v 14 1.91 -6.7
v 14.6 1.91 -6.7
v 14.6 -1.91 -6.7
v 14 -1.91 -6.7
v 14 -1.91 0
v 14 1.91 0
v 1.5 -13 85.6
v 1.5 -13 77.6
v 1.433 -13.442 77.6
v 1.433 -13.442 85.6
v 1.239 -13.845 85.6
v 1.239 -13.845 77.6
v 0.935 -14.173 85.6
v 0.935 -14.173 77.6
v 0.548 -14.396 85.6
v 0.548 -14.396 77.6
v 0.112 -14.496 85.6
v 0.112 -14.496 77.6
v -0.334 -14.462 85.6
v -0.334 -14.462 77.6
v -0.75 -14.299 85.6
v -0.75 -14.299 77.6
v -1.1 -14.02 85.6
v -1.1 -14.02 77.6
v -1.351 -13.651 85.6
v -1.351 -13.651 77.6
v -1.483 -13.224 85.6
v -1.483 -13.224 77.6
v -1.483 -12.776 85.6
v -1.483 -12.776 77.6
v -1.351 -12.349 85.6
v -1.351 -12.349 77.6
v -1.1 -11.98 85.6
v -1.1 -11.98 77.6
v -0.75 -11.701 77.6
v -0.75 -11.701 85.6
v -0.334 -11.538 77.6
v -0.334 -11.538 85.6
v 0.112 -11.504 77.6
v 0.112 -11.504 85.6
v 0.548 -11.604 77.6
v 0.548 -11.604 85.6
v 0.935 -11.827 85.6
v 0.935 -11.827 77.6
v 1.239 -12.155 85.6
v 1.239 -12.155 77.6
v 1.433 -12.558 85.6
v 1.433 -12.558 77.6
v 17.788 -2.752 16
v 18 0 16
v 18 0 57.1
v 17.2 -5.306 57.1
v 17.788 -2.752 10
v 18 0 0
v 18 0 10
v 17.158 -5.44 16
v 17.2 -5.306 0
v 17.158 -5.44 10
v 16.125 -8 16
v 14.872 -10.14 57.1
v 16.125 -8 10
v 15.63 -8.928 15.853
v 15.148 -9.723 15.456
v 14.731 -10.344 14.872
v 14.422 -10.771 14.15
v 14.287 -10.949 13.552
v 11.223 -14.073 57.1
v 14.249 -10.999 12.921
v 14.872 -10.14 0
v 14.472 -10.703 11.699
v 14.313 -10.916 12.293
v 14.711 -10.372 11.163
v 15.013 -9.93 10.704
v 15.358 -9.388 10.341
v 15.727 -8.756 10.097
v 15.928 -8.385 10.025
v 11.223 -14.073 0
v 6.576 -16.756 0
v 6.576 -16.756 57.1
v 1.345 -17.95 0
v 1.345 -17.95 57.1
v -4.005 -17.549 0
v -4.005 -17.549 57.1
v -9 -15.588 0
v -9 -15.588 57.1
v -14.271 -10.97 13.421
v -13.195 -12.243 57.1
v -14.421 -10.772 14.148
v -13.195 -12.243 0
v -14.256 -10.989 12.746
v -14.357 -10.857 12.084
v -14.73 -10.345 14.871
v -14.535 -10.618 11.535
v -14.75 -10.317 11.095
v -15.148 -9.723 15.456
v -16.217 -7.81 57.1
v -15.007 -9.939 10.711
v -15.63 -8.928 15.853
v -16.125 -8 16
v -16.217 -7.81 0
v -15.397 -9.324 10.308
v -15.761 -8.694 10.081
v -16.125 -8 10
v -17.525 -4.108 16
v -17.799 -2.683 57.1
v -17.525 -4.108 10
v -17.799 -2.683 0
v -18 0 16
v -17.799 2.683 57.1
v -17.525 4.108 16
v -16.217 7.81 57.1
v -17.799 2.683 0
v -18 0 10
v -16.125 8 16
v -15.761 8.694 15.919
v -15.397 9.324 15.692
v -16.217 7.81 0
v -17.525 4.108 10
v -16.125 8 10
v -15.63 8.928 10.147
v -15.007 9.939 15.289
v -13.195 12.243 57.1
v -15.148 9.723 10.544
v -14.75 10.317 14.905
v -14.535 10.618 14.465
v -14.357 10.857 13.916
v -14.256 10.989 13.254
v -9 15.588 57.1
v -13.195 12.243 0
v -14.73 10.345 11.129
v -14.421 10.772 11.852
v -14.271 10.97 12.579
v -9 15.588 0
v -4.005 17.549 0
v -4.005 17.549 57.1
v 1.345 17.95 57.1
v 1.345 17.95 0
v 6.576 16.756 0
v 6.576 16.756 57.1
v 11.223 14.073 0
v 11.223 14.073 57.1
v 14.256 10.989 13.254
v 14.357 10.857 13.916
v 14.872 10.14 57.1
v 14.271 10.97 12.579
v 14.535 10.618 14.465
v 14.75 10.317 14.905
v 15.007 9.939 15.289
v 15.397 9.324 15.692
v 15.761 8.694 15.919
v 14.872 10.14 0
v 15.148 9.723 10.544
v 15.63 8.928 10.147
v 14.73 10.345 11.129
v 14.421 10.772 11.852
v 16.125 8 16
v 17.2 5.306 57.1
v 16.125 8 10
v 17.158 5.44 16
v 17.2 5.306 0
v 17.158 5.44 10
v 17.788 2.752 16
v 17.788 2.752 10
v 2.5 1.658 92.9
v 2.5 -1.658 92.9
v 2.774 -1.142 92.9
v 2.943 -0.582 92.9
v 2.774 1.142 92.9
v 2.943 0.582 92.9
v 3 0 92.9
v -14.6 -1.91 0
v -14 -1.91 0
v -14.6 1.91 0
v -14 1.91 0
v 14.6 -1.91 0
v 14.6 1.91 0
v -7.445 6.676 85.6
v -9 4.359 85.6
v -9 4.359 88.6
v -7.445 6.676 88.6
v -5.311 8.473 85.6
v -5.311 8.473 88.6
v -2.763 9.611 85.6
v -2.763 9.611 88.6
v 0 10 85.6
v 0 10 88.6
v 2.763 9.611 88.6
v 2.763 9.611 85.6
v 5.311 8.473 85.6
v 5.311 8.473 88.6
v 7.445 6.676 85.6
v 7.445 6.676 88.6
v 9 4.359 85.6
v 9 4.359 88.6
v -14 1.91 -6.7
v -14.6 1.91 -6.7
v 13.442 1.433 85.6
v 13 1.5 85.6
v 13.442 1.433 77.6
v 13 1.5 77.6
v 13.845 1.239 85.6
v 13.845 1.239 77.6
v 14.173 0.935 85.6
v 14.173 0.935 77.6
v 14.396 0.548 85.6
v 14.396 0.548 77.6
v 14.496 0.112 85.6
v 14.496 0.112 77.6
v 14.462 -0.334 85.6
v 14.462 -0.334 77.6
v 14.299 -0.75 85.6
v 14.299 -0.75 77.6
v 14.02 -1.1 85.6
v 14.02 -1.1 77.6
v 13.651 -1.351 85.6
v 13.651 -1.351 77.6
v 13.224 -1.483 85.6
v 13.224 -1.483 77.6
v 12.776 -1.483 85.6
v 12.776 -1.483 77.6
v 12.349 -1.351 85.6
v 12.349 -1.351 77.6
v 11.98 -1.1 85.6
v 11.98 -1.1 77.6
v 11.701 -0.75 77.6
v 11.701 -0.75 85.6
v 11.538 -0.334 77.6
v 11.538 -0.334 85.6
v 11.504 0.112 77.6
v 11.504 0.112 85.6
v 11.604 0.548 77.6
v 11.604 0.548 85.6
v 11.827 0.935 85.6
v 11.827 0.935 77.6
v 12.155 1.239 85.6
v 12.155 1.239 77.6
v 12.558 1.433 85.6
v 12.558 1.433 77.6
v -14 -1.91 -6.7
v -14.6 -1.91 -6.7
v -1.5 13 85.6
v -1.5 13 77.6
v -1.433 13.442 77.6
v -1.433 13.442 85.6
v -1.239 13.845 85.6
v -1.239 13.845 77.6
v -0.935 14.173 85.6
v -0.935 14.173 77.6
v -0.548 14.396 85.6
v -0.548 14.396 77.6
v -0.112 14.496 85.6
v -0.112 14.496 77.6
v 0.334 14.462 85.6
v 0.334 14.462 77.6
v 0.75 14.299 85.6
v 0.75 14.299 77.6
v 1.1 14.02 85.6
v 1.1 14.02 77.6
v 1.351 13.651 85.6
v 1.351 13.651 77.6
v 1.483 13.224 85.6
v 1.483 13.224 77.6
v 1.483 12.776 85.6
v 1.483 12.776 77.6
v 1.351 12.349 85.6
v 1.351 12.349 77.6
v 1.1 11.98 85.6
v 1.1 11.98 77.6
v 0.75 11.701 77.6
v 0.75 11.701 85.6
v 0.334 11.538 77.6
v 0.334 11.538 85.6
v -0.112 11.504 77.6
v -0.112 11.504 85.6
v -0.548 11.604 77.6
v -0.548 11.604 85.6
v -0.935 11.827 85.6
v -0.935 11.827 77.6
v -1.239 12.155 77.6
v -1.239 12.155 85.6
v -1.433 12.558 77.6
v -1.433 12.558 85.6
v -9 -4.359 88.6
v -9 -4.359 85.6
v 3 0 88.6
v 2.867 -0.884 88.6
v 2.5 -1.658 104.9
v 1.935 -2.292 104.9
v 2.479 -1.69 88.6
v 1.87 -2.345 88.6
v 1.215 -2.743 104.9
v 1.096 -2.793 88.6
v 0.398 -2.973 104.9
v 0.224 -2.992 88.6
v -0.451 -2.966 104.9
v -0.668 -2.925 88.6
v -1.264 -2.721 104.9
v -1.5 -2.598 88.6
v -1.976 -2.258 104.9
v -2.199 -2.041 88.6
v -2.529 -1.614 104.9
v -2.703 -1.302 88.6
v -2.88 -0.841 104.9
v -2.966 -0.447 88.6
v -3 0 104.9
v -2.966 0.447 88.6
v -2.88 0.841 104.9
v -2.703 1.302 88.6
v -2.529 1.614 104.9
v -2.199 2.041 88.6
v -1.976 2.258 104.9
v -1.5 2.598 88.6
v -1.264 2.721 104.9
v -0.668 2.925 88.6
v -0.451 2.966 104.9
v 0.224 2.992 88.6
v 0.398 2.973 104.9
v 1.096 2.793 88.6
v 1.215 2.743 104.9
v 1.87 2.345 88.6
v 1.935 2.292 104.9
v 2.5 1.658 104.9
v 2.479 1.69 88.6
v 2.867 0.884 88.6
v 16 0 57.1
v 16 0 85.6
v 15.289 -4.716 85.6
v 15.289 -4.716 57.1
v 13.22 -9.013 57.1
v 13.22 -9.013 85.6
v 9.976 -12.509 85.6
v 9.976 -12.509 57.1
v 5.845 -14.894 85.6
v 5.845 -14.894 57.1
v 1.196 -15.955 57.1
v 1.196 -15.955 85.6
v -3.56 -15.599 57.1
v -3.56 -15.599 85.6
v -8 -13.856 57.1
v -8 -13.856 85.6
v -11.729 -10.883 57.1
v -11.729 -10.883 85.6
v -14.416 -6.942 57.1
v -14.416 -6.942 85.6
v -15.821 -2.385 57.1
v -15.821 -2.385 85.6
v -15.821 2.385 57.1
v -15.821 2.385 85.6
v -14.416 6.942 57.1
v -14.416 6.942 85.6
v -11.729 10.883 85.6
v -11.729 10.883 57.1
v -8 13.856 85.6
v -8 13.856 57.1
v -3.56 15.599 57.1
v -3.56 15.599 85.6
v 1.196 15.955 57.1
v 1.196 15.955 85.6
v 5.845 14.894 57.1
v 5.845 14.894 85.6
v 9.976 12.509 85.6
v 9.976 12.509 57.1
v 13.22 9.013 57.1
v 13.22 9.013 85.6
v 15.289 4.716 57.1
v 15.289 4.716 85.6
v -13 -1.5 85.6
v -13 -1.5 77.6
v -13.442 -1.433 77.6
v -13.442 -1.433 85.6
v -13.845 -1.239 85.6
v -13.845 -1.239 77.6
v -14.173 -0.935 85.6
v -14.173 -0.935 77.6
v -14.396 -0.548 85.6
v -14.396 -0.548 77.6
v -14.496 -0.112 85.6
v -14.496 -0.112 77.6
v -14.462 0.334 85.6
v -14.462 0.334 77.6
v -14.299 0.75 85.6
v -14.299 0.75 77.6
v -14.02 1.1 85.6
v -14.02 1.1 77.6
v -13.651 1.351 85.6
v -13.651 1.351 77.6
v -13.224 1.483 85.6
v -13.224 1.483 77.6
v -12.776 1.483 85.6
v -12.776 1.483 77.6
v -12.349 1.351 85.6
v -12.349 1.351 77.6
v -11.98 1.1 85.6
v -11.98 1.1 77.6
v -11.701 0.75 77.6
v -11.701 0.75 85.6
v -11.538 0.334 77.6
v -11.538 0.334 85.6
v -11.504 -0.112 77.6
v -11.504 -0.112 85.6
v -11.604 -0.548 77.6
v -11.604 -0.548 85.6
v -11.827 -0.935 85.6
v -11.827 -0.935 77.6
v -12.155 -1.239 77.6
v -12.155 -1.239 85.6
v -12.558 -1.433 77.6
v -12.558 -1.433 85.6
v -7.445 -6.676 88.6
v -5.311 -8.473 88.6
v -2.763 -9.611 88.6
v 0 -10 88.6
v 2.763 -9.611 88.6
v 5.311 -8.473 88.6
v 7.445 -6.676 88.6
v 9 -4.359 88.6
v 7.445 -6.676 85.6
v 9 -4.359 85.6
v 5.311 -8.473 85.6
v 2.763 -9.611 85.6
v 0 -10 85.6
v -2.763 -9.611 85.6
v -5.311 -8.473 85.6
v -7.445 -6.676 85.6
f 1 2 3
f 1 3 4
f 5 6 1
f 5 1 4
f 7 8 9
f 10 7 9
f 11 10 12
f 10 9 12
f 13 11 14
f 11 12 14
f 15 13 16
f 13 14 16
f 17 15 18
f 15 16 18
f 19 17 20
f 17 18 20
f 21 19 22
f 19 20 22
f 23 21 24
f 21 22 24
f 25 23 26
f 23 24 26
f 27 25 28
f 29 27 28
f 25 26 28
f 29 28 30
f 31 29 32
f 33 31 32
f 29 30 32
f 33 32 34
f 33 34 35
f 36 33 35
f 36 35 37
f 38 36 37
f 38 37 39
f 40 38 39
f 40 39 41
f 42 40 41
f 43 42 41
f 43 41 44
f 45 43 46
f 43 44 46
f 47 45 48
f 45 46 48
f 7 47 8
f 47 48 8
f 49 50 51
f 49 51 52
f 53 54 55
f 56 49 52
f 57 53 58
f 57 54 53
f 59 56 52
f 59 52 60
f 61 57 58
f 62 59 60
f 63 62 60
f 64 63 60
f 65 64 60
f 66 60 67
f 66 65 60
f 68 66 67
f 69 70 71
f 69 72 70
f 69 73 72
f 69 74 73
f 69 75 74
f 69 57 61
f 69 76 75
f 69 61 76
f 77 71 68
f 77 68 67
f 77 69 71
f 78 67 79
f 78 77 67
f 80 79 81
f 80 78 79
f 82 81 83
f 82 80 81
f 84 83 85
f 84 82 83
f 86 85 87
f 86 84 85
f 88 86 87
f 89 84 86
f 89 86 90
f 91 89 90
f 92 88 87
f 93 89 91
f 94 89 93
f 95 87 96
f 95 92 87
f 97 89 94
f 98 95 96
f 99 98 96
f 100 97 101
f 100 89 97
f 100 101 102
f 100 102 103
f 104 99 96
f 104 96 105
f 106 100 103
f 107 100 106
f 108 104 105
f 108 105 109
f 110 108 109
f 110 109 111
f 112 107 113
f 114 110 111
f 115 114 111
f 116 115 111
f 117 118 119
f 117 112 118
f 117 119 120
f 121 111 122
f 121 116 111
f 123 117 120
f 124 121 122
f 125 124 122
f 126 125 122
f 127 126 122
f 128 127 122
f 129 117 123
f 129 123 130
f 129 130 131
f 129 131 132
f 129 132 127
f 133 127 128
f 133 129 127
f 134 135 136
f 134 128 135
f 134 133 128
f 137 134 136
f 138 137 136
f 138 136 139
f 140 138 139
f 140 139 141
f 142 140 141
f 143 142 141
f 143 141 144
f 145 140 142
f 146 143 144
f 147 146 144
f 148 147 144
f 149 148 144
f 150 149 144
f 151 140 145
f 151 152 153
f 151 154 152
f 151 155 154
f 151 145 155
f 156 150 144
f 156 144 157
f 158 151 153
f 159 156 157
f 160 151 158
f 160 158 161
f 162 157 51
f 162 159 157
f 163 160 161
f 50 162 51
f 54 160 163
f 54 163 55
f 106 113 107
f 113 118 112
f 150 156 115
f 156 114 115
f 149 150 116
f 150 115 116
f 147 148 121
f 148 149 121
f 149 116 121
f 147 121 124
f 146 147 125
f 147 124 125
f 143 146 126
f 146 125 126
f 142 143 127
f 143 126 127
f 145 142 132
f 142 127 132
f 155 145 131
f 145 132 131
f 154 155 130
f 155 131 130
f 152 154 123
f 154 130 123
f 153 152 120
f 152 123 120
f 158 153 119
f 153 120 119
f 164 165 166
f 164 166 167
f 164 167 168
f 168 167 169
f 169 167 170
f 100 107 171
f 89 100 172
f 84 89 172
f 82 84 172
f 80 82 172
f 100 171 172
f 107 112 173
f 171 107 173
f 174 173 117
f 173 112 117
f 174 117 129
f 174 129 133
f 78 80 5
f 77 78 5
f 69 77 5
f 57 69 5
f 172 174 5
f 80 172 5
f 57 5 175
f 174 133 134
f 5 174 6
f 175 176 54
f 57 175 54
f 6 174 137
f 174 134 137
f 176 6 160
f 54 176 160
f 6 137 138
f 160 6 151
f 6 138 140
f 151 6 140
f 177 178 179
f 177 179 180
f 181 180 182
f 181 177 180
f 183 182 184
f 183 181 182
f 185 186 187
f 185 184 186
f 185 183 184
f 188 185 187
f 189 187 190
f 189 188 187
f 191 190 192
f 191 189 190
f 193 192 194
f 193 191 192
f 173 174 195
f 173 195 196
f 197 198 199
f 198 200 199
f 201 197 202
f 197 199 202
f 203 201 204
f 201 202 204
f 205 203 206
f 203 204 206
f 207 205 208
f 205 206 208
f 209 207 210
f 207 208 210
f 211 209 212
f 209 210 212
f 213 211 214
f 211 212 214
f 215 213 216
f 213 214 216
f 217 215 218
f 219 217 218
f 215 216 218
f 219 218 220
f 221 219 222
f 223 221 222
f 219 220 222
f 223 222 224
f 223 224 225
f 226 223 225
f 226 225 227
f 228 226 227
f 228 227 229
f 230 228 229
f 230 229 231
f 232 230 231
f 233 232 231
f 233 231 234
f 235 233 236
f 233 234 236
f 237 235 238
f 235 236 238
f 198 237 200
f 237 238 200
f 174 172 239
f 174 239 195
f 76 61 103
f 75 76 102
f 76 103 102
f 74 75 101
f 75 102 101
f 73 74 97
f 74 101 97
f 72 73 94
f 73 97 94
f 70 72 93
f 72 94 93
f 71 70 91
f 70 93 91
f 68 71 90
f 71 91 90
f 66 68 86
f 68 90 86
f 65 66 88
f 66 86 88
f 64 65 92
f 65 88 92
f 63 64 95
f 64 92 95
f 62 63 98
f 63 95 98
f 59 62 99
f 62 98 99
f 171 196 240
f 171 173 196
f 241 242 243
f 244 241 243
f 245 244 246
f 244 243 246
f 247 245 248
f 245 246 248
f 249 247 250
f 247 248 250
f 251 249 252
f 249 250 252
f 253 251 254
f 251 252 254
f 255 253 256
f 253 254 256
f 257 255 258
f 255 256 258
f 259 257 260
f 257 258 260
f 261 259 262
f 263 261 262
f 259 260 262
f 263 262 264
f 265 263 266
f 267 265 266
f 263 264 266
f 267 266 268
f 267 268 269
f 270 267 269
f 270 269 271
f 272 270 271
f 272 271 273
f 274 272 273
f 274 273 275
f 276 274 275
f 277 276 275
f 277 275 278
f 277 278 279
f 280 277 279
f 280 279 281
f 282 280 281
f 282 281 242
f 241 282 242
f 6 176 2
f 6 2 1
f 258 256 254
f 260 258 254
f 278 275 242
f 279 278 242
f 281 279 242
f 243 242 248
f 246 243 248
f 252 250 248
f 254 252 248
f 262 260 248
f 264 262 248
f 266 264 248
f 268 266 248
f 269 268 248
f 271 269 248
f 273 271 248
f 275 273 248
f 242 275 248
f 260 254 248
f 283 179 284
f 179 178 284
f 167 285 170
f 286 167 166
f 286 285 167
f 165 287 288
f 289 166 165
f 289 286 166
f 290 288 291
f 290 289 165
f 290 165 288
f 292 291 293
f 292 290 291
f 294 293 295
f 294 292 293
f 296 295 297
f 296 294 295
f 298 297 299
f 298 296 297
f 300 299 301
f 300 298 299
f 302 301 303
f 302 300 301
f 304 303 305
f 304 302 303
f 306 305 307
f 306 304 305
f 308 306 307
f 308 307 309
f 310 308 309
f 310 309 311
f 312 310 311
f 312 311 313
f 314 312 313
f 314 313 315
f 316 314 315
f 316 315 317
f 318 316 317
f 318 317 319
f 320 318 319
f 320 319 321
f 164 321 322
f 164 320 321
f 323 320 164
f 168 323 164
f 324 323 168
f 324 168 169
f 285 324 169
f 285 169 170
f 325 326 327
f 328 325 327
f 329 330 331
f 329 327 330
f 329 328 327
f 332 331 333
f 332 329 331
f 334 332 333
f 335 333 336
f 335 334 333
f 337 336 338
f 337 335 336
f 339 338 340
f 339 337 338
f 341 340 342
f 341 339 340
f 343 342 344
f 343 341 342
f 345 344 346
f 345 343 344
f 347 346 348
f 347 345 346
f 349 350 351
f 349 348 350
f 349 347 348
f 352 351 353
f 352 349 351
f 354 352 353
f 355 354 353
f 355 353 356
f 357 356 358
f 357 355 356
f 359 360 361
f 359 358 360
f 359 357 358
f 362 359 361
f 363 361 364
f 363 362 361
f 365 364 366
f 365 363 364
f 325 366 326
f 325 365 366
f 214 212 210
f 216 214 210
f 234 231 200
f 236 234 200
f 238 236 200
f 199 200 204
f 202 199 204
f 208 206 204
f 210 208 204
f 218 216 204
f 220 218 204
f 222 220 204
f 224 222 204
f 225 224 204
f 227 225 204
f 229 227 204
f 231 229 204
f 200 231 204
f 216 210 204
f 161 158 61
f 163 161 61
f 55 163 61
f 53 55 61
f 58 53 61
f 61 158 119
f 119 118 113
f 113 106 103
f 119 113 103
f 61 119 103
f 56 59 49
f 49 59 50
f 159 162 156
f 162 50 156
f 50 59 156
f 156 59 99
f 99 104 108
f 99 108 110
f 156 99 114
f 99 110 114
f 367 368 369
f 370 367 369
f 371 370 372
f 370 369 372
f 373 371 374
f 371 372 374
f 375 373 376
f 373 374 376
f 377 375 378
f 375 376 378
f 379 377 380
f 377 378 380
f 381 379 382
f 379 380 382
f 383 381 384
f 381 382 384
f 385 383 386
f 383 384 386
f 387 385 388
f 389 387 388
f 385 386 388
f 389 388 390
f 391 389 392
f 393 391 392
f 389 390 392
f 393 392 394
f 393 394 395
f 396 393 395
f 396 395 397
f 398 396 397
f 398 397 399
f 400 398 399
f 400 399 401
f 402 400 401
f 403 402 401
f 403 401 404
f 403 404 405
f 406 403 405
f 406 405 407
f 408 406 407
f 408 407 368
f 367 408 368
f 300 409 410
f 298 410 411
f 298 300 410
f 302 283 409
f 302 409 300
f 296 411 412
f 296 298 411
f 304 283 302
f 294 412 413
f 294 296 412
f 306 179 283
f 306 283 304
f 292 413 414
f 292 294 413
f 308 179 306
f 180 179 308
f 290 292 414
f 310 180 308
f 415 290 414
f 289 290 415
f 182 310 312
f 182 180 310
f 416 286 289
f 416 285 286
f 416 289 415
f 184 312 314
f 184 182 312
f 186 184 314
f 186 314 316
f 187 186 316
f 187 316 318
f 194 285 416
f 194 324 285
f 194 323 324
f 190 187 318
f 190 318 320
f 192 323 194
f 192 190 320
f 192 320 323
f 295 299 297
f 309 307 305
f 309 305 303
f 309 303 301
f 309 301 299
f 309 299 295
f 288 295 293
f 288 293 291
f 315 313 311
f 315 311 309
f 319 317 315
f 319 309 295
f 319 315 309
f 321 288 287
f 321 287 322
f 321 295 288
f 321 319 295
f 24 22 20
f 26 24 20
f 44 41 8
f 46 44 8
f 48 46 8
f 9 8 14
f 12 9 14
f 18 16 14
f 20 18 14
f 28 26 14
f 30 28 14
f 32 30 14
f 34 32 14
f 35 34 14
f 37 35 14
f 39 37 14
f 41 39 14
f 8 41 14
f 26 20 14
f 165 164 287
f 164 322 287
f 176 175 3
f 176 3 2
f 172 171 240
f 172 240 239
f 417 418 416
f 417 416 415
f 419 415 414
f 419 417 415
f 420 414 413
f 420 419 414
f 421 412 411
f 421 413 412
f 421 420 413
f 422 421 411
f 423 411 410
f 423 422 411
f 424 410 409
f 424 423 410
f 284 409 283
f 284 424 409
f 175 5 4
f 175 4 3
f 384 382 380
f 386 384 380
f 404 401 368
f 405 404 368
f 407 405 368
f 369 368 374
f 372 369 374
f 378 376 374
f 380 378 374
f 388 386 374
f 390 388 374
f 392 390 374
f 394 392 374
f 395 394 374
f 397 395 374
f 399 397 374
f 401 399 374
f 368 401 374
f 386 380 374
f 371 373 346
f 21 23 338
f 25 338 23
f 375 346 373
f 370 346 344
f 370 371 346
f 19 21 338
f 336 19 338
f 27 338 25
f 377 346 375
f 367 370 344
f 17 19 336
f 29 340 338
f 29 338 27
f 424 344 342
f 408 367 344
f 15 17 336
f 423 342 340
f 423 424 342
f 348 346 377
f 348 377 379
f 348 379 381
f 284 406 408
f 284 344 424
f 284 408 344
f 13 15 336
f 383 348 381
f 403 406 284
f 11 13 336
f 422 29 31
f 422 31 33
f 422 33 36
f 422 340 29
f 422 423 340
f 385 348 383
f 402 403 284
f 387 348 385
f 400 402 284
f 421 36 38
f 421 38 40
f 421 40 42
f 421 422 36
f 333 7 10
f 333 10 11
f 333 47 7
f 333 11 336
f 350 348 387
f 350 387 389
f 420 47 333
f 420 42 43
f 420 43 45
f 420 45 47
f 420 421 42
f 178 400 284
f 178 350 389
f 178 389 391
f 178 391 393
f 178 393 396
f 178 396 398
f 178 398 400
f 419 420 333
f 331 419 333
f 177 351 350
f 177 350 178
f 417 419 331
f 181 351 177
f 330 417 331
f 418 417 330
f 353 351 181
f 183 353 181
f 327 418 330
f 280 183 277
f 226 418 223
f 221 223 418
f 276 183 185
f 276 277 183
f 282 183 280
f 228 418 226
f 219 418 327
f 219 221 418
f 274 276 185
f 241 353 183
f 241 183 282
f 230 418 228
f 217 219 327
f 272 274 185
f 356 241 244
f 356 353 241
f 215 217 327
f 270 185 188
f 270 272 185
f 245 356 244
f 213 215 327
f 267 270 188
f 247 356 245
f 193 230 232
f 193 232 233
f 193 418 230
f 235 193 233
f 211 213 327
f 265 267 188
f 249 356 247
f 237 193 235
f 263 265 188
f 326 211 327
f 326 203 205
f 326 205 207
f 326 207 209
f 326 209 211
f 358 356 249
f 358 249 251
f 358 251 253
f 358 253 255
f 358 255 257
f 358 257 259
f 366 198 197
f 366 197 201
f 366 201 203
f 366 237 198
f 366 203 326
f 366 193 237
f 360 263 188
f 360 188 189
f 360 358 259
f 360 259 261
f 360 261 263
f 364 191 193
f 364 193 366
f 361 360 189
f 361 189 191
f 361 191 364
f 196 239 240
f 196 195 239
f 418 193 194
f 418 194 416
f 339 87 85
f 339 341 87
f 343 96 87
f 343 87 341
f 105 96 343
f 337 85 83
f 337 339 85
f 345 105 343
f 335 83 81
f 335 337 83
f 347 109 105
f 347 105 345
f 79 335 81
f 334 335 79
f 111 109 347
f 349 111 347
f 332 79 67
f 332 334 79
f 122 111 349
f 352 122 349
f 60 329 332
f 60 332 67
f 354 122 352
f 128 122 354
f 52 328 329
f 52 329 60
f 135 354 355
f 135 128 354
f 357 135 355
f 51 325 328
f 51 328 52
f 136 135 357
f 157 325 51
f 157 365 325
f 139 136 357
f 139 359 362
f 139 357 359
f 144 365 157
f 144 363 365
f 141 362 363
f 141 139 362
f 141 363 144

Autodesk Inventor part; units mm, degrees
ref_plane "YZ Plane" through (0, 0, 0) normal (1, 0, 0) x (0, 1, 0)
ref_plane "XZ Plane" through (0, 0, 0) normal (0, 1, 0) x (-1, 0, 0)
ref_plane "XY Plane" through (0, 0, 0) normal (0, 0, 1) x (1, 0, 0)
sketch "Sketch1" plane through (0, 0, 0) normal (0, 0, 1) x (1, 0, 0)
  circle A0 centre (0, 0) radius 18
  dimension "MotorDiameter" = 36
extrude "Extrusion1" add sketch "Sketch1" along normal blind 57.1
sketch "Sketch2" plane through (0, 0, 57.1) normal (0, 0, 1) x (1, 0, 0)
  circle A0 centre (0, 0) radius 16
  dimension "d3" = 32
extrude "Extrusion2" add sketch "Sketch2" along normal blind 28.5
sketch "Sketch3" plane through (0, 0, 85.6) normal (0, 0, 1) x (1, 0, 0)
  line L0 (-9, 4.3589) -> (-9, -4.3589)
  line L1 (9, 4.3589) -> (9, -4.3589)
  arc A0 (9, 4.3589) -> (-9, 4.3589) centre (0, 0) ccw
  arc A1 (-9, -4.3589) -> (9, -4.3589) centre (0, 0) ccw
  circle A2 centre (0, 0) radius 16 projected
  dimension "d7" = 18
  dimension "d8" = 9
  dimension "d9" = 10
  dimension "d10" = 10
extrude "Extrusion3" add sketch "Sketch3" along normal blind 3 contours A0 L1 A1 L0
sketch "Sketch4" plane through (0, 0, 88.6) normal (0, 0, 1) x (1, 0, 0)
  arc A0 (-9, -4.3589) -> (9, -4.3589) centre (0, 0) ccw projected
  circle A1 centre (0, 0) radius 3
  dimension "d13" = 6
extrude "Extrusion4" add sketch "Sketch4" along normal blind 16.3
sketch "Sketch5" plane through (0, 0, 104.9) normal (0, 0, 1) x (1, 0, 0)
  circle A0 centre (0, 0) radius 3 projected
  line L0 (2.5, 1.6583) -> (2.5, -1.6583)
  dimension "d16" = 2.5
extrude "Extrusion5" cut sketch "Sketch5" against normal blind 12 contours A0 L0 picked at (2.5914, -0.3806)
sketch "Sketch6" plane through (0, 0, 85.6) normal (0, 0, 1) x (1, 0, 0)
  circle A0 centre (0, 0) radius 16 projected
  circle A1 centre (0, 0) radius 13
  line L0 (0, 0) -> (-13, 0)
  line L1 (0, 0) -> (-13, 0)
  dimension "d19" = 26
  dimension "d20" = 0
hole "Hole1" at (-13, 0, 85.6) direction (0, 0, -1) diameter 3 depth 8
pattern_circular "Circular Pattern1" count 4 over 360 about axis through (0, 0, 57.1) along (0, 0, 1) of "Hole1"
thread "Thread1" size "M3x0.5" class "6H" standard "ANSI Metric M Profile" full length
thread "Thread2" size "M3x0.5" class "6H" standard "ANSI Metric M Profile" full length
thread "Thread3" size "M3x0.5" class "6H" standard "ANSI Metric M Profile" full length
thread "Thread4" size "M3x0.5" class "6H" standard "ANSI Metric M Profile" full length
sketch "Sketch7" plane through (0, 0, 0) normal (0, 0, -1) x (-1, 0, 0)
  line L0 (-14.6, 1.91) -> (-14, 1.91)
  line L1 (-14, 1.91) -> (-14, -1.91)
  line L2 (-14, -1.91) -> (-14.6, -1.91)
  line L3 (-14.6, -1.91) -> (-14.6, 1.91)
  line L4 (14, 1.91) -> (14.6, 1.91)
  line L5 (14.6, 1.91) -> (14.6, -1.91)
  line L6 (14.6, -1.91) -> (14, -1.91)
  line L7 (14, -1.91) -> (14, 1.91)
  point P0 (0, 0)
  point P1 (-14, 0)
  point P2 (14, 0)
  dimension "d39" = 3.82
  dimension "d40" = 0.6
  dimension "d41" = 3.82
  dimension "d42" = 0.6
  dimension "d43" = 28
  dimension "d44" = 14
extrude "Extrusion6" add sketch "Sketch7" along normal blind 6.7
sketch "Sketch8" plane through (0, 0, 0) normal (1, 0, 0) x (0, 1, 0)
  line L0 (-8, 16) -> (8, 16)
  line L1 (8, 10) -> (-8, 10)
  arc A0 (8, 10) -> (8, 16) centre (8, 13) ccw
  arc A1 (-8, 16) -> (-8, 10) centre (-8, 13) ccw
  line L2 (0, 0) -> (0, -14.3353)
  line L3 (0, 0) -> (-17.7641, 0)
  dimension "VentLength" = 16
  dimension "VentHalfWidth" = 3
  dimension "d49" = 8
  dimension "VentOffsetFromEnd" = 10
extrude "Extrusion7" cut sketch "Sketch8" along normal through all both and the other way through all
equation "\"MotorLength\" = FrontLength + BackLength"
equation "\"VentWidth\" = 2 * VentHalfWidth"
equation "\"FrontLength\" = 28.5"
equation "\"BackLength\" = 57.1"
properties part number "IG32P-Motor"
